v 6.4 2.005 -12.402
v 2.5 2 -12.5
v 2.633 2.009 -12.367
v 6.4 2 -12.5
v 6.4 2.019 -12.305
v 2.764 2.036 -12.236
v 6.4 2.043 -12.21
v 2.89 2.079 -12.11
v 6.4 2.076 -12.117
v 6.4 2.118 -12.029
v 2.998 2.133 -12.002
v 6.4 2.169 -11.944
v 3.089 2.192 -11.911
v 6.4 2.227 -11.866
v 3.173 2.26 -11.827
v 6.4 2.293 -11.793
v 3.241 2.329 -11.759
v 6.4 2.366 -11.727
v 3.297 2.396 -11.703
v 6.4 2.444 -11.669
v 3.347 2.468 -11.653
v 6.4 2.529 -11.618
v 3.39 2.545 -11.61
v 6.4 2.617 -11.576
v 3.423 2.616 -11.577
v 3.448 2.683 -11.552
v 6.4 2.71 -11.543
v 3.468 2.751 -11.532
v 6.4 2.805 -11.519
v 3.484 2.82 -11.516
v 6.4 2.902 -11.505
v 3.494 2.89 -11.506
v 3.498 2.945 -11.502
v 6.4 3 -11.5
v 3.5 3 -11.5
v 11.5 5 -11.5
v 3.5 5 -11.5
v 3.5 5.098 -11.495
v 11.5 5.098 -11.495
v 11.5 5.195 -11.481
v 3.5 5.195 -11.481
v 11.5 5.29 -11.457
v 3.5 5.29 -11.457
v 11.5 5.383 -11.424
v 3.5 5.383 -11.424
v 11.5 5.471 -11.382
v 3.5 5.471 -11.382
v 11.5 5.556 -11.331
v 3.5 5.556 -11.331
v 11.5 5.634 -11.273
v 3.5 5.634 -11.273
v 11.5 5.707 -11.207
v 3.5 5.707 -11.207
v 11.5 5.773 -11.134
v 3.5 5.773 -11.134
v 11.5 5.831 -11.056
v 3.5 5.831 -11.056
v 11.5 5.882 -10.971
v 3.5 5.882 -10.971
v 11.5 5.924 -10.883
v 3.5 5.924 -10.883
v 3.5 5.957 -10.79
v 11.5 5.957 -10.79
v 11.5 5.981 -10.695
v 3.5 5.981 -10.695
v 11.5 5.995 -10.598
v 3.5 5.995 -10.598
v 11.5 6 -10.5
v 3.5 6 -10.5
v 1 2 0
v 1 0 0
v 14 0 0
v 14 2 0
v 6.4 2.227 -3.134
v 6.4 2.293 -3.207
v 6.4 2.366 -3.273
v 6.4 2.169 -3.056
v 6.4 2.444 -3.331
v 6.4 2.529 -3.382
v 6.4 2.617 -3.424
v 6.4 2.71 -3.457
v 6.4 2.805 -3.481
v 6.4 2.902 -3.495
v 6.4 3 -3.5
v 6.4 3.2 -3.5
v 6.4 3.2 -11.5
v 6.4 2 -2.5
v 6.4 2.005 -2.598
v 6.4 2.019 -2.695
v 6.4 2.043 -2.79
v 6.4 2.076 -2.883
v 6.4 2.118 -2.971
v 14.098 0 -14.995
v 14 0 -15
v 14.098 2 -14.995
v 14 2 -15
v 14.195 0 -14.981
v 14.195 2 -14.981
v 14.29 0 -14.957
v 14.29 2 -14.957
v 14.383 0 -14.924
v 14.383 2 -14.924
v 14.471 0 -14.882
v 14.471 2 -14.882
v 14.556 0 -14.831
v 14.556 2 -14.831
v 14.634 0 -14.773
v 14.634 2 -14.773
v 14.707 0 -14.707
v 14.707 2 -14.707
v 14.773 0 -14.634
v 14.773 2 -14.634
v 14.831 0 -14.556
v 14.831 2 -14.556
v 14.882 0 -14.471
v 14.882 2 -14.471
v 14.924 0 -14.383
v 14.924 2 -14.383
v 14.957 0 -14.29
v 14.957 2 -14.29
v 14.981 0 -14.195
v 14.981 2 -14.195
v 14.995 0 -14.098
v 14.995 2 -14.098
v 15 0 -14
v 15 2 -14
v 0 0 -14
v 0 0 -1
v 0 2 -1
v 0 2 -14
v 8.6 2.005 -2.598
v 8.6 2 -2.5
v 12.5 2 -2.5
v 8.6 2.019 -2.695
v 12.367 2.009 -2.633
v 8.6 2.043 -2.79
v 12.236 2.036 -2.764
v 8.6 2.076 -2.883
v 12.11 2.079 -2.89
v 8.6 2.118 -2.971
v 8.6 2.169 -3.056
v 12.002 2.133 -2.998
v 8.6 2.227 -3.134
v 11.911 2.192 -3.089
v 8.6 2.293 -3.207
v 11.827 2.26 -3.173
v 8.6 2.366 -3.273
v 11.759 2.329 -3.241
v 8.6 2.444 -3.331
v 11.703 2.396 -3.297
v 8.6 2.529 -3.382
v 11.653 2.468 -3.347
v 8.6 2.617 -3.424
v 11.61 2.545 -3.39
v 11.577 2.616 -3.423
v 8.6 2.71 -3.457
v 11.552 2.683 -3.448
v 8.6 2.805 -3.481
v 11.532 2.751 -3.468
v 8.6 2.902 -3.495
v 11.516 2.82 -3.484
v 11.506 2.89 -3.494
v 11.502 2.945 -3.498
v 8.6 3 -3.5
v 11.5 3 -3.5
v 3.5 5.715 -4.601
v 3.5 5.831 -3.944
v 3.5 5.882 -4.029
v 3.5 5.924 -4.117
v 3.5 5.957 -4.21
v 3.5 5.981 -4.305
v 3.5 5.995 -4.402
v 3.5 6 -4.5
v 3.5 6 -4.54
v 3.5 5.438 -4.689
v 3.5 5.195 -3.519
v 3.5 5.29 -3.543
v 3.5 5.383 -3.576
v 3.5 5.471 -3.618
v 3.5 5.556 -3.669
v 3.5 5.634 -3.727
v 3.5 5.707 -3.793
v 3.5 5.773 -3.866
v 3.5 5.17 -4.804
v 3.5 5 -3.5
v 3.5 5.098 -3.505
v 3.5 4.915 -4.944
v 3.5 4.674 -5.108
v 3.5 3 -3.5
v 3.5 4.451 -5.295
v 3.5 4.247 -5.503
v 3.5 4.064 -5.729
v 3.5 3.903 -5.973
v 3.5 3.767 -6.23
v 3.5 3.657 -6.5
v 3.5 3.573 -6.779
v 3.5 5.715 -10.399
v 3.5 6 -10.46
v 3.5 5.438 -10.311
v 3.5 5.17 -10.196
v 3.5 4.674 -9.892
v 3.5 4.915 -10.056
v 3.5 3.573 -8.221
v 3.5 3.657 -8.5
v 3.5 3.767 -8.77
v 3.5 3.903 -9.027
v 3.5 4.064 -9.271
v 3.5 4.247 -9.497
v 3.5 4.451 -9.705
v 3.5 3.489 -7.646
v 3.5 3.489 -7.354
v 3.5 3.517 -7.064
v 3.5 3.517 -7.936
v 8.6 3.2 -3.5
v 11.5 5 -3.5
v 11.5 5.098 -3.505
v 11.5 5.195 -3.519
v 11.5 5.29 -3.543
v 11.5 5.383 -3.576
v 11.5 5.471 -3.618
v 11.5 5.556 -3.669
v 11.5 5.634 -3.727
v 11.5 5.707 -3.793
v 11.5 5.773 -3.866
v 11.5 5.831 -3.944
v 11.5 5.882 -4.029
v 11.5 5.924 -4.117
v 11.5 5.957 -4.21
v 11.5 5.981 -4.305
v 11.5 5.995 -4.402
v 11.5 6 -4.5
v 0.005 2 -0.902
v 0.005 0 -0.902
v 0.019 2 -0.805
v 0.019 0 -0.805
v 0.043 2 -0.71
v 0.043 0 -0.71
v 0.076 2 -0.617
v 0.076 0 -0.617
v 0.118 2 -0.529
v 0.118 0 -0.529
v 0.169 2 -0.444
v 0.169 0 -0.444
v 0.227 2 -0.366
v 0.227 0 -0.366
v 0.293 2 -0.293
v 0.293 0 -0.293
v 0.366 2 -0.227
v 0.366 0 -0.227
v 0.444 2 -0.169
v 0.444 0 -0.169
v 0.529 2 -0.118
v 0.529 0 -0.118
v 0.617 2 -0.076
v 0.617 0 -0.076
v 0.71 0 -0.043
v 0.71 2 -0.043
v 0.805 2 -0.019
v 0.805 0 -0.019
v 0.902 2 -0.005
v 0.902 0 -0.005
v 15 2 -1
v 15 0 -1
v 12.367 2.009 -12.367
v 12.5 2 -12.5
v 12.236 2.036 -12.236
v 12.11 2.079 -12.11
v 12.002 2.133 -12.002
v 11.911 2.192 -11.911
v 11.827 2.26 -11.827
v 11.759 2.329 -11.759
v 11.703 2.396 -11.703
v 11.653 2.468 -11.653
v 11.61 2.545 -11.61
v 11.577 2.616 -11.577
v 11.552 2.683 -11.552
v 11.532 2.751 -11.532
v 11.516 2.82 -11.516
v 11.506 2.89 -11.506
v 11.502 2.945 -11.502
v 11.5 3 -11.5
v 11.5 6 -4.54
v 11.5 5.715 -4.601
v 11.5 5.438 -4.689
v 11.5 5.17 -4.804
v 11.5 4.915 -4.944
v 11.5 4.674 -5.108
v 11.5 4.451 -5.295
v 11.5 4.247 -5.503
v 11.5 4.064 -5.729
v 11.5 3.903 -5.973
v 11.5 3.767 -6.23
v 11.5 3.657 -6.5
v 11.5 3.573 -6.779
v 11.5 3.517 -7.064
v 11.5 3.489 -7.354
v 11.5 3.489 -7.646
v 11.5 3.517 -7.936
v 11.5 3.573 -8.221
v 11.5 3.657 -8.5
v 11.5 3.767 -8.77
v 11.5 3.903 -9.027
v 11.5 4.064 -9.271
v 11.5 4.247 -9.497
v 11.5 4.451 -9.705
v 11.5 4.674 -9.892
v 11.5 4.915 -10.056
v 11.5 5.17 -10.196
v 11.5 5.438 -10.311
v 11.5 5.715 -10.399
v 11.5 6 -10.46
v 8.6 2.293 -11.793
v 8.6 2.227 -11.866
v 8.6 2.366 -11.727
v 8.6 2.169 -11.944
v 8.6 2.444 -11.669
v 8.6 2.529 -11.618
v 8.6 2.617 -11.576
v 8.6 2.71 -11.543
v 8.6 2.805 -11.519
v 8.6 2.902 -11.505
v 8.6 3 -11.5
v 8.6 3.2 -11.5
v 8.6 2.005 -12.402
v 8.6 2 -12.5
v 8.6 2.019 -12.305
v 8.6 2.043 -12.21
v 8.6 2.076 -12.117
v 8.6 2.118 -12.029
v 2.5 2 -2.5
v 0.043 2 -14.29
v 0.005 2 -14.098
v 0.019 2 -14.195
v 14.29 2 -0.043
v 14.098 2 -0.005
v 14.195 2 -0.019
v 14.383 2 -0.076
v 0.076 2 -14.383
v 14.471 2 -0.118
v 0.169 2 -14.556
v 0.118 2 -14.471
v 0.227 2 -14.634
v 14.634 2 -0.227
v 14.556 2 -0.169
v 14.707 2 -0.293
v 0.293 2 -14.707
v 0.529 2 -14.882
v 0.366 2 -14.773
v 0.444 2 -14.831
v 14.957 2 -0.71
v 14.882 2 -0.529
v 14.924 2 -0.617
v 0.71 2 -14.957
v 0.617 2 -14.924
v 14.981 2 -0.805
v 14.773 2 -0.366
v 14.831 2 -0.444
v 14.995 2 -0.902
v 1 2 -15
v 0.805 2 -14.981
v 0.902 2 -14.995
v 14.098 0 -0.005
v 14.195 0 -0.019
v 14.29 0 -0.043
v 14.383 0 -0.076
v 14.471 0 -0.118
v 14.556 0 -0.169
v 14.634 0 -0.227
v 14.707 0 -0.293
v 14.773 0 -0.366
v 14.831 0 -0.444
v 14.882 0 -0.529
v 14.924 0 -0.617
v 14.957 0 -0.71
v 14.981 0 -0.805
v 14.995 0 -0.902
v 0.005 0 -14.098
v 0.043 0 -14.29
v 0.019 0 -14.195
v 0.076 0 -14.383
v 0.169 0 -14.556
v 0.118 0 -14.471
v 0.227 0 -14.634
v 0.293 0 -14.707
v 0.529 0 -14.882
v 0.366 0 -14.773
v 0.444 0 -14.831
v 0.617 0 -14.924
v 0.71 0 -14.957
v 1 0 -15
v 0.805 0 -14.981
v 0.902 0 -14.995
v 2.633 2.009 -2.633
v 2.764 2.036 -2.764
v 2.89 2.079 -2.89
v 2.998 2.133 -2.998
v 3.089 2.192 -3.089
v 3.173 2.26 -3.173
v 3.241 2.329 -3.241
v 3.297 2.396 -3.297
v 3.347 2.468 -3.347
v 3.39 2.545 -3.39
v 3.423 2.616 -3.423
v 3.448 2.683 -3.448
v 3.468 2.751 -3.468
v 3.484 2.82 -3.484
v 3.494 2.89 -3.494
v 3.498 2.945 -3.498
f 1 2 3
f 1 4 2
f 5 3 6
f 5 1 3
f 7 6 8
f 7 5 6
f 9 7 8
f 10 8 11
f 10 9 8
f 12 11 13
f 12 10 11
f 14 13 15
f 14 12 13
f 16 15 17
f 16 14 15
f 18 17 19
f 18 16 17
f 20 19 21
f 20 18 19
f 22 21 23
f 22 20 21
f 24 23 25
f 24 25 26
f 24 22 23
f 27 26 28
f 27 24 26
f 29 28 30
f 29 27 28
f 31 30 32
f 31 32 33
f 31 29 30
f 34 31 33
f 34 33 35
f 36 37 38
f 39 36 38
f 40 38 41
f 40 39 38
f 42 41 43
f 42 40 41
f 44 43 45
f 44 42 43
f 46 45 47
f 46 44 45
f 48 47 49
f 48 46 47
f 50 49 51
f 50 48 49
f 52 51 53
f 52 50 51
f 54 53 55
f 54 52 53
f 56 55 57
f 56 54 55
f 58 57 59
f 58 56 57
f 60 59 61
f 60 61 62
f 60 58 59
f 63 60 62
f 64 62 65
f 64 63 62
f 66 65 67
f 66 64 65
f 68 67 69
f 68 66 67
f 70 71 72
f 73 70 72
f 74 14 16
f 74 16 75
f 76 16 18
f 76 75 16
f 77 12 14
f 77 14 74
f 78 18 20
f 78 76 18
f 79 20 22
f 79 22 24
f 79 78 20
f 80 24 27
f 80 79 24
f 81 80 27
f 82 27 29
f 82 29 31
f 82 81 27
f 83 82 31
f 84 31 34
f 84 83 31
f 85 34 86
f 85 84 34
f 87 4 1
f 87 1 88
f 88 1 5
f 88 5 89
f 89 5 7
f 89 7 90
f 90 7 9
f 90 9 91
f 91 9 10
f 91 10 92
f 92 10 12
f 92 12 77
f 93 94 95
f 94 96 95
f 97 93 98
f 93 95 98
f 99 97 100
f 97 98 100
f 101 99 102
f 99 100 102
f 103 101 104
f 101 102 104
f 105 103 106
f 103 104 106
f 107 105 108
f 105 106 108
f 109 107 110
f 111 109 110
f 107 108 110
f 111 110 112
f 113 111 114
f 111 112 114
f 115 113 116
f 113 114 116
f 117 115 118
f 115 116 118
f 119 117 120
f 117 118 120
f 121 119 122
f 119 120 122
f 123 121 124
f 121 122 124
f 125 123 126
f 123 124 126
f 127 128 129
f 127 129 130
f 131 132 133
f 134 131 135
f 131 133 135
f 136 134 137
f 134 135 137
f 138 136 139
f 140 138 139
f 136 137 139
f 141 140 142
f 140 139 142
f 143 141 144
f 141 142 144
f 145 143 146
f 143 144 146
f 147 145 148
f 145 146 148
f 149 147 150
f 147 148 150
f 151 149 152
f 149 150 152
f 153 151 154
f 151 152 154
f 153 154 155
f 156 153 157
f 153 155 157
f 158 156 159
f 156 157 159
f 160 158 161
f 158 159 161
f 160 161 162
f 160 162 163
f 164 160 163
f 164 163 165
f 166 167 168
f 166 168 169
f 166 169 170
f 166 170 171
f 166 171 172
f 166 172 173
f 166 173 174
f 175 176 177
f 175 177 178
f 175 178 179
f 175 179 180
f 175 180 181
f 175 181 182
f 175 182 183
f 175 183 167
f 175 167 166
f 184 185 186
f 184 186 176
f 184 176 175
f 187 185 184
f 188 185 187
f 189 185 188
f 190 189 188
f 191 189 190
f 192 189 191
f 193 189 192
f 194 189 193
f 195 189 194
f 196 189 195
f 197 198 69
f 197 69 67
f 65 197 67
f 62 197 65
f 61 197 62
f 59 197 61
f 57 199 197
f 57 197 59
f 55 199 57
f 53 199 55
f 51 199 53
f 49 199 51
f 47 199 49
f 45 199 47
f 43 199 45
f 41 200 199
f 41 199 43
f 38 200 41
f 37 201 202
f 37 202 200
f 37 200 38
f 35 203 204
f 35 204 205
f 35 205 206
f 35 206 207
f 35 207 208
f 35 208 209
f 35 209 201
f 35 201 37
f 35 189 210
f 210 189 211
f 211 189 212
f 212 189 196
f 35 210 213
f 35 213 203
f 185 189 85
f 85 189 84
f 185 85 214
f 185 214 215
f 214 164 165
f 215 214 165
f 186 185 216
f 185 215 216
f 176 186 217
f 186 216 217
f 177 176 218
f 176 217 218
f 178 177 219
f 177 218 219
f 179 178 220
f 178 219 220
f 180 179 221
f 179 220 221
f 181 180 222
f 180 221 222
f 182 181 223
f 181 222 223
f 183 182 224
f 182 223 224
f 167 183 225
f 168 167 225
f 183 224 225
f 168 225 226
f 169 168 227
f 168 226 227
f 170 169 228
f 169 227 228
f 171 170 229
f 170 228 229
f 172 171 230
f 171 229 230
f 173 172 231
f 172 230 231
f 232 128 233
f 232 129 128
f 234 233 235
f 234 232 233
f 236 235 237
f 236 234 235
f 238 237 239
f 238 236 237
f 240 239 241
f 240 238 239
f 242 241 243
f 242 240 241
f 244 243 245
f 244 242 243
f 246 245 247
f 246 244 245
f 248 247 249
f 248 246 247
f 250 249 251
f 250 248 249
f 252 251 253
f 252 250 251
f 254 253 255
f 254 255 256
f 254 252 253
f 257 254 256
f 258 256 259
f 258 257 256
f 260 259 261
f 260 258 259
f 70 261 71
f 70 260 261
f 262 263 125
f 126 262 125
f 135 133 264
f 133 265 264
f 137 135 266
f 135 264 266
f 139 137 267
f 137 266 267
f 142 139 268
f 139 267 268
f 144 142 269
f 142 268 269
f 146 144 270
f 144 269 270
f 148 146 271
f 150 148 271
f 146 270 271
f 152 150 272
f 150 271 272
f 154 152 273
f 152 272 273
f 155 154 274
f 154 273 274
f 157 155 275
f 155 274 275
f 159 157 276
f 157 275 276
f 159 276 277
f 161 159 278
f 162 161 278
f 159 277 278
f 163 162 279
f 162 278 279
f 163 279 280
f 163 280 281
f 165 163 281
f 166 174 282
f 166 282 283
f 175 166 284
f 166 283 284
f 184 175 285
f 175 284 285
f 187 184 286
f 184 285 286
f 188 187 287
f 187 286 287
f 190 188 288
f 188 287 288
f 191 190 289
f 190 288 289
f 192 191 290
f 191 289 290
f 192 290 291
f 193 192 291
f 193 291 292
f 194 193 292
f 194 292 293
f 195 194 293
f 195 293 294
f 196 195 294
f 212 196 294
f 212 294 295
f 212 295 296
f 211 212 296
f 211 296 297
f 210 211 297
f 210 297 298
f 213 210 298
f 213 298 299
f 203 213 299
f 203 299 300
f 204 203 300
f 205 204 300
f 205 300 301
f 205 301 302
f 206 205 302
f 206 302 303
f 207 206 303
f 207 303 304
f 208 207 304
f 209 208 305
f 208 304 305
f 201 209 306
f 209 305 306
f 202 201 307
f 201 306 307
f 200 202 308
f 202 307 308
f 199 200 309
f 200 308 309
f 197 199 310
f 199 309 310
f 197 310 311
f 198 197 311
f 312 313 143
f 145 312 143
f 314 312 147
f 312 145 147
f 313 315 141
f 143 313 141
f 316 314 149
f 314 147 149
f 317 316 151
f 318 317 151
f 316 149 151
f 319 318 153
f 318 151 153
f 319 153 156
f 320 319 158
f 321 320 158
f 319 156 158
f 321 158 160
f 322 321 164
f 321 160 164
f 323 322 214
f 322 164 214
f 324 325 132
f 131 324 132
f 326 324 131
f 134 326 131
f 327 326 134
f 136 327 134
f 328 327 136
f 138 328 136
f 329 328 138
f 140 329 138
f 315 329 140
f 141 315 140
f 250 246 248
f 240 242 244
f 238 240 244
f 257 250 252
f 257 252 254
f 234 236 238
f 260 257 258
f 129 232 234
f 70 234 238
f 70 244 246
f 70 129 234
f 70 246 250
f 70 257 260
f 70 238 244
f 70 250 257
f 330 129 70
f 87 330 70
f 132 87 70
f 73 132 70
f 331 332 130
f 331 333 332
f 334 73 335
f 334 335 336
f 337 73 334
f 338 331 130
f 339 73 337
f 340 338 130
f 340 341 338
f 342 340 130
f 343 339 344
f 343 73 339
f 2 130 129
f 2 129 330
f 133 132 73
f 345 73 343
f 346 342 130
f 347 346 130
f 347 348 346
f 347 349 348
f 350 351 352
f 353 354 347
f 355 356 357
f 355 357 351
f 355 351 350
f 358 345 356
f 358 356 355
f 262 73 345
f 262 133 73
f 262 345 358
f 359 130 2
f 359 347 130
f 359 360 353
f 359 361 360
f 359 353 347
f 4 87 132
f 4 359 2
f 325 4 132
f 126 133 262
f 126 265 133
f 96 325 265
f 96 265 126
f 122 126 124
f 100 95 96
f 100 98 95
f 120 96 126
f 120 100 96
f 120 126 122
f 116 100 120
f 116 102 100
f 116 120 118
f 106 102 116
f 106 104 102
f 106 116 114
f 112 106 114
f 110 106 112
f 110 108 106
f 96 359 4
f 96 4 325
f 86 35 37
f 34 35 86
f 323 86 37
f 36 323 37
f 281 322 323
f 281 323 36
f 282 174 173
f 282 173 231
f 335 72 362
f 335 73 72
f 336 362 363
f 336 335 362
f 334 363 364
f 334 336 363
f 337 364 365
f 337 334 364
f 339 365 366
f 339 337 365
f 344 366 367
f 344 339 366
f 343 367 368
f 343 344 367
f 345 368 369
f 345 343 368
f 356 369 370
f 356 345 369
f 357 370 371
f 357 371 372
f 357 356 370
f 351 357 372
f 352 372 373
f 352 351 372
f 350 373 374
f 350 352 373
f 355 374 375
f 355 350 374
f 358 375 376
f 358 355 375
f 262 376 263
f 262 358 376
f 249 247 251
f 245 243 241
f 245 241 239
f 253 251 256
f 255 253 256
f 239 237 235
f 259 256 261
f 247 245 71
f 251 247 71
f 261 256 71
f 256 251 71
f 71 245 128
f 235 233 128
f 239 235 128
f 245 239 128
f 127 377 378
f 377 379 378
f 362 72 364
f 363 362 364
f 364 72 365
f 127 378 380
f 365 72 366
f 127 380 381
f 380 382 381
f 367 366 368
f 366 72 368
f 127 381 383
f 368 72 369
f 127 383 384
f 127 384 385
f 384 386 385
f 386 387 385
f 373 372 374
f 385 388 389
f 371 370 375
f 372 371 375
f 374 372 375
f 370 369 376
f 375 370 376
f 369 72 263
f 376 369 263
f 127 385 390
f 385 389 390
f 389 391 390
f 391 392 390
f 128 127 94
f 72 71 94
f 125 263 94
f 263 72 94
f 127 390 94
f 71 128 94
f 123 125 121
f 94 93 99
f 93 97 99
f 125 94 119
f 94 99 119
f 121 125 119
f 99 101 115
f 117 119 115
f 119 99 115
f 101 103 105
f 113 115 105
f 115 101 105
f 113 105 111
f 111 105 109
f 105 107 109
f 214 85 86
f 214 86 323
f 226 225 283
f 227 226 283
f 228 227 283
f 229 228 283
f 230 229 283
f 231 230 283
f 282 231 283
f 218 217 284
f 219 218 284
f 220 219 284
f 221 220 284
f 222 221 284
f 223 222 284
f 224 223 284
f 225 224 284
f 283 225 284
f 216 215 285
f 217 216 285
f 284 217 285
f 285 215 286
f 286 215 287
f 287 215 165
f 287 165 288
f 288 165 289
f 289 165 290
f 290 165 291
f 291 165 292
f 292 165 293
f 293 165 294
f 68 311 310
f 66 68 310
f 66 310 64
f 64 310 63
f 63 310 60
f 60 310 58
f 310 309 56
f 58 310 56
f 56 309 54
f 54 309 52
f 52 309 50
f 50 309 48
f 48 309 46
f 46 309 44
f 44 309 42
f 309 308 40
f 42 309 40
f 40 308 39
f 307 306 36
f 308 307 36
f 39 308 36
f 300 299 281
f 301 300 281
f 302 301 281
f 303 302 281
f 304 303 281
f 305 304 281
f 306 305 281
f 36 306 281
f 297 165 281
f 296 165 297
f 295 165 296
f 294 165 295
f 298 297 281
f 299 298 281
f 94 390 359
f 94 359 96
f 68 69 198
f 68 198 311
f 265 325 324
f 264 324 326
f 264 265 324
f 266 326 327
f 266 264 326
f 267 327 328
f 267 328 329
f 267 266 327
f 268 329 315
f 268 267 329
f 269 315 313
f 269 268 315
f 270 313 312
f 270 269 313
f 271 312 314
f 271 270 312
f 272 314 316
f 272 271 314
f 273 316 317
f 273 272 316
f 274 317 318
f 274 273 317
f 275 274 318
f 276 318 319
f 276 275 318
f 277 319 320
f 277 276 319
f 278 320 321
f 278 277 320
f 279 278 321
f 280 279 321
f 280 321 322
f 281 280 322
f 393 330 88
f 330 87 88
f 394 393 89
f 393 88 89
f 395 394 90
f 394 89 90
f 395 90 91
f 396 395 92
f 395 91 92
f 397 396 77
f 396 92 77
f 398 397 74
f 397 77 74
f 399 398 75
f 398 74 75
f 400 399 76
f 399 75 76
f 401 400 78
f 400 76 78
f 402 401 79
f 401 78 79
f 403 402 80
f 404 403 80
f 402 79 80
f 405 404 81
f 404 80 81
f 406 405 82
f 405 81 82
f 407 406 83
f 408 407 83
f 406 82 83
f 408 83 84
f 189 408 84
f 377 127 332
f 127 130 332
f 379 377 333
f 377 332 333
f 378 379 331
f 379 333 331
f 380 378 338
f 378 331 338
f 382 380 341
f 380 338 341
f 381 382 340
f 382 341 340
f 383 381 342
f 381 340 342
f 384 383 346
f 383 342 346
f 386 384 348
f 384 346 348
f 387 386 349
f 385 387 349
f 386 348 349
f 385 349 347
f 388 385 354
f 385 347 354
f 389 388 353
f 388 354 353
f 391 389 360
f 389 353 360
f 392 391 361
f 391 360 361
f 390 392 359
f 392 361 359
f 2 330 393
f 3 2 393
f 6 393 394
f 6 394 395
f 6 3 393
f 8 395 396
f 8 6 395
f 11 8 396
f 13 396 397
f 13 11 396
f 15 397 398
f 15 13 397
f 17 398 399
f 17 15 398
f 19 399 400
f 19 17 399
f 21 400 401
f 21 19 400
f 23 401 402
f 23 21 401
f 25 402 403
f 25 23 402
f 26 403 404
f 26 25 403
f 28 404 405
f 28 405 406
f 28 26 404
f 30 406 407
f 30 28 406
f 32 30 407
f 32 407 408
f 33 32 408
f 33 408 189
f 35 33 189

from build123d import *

# Parameters (mm, degrees)
CROQUIS1_W              = 15
CROQUIS1_H              = 15
SALIENTE_EXTRUIR1_DEPTH = 2
CROQUIS2_W              = 8
CROQUIS2_H              = 8
SALIENTE_EXTRUIR2_DEPTH = 4
CROQUIS3_R              = 3
CORTAR_EXTRUIR1_DEPTH   = 8
CROQUIS4_W              = 2.2
CROQUIS4_H              = 1.2
CORTAR_EXTRUIR3_DEPTH   = 8
REDONDEO1_R             = 1


with BuildPart() as part:
    # Croquis1 → Saliente-Extruir1 (new body)
    with BuildSketch(Plane(origin=(0, 0, 0), x_dir=(1, 0, 0), z_dir=(0, 1, 0))):
        with Locations((7.5, 7.5)):
            Rectangle(CROQUIS1_W, CROQUIS1_H)
    extrude(amount=SALIENTE_EXTRUIR1_DEPTH)

    # Croquis2 → Saliente-Extruir2 (add)
    with BuildSketch(Plane(origin=(0, 2, 0), x_dir=(1, 0, 0), z_dir=(0, 1, 0))):
        with Locations((7.5, 7.5)):
            Rectangle(CROQUIS2_W, CROQUIS2_H)
    extrude(amount=SALIENTE_EXTRUIR2_DEPTH)

    # Croquis3 → Cortar-Extruir1 (cut)
    with BuildSketch(Plane(origin=(11.5, 0, 0), x_dir=(0, 0, -1), z_dir=(1, 0, 0))):
        with Locations((7.5, 6.485438982)):
            Circle(CROQUIS3_R)
    extrude(amount=-CORTAR_EXTRUIR1_DEPTH, mode=Mode.SUBTRACT)

    # Croquis4 → Cortar-Extruir3 (cut)
    with BuildSketch(Plane.XY.offset(-3.5)):
        with Locations((7.5, 2.6)):
            Rectangle(CROQUIS4_W, CROQUIS4_H)
    extrude(amount=-CORTAR_EXTRUIR3_DEPTH, mode=Mode.SUBTRACT)

    # Redondeo1
    redondeo1_edges = [part.edges().sort_by_distance(p)[0] for p in [
        (11.5, 2, -7.5),
        (10.05, 2, -11.5),
        (3.5, 2, -7.5),
        (4.95, 2, -3.5),
        (7.5, 6, -11.5),
        (7.5, 6, -3.5),
        (10.05, 2, -3.5),
        (4.95, 2, -11.5),
        (0, 1, -15),
        (15, 1, -15),
        (15, 1, 0),
        (0, 1, 0),
    ]]
    fillet(redondeo1_edges, radius=REDONDEO1_R)


solid = part.part
